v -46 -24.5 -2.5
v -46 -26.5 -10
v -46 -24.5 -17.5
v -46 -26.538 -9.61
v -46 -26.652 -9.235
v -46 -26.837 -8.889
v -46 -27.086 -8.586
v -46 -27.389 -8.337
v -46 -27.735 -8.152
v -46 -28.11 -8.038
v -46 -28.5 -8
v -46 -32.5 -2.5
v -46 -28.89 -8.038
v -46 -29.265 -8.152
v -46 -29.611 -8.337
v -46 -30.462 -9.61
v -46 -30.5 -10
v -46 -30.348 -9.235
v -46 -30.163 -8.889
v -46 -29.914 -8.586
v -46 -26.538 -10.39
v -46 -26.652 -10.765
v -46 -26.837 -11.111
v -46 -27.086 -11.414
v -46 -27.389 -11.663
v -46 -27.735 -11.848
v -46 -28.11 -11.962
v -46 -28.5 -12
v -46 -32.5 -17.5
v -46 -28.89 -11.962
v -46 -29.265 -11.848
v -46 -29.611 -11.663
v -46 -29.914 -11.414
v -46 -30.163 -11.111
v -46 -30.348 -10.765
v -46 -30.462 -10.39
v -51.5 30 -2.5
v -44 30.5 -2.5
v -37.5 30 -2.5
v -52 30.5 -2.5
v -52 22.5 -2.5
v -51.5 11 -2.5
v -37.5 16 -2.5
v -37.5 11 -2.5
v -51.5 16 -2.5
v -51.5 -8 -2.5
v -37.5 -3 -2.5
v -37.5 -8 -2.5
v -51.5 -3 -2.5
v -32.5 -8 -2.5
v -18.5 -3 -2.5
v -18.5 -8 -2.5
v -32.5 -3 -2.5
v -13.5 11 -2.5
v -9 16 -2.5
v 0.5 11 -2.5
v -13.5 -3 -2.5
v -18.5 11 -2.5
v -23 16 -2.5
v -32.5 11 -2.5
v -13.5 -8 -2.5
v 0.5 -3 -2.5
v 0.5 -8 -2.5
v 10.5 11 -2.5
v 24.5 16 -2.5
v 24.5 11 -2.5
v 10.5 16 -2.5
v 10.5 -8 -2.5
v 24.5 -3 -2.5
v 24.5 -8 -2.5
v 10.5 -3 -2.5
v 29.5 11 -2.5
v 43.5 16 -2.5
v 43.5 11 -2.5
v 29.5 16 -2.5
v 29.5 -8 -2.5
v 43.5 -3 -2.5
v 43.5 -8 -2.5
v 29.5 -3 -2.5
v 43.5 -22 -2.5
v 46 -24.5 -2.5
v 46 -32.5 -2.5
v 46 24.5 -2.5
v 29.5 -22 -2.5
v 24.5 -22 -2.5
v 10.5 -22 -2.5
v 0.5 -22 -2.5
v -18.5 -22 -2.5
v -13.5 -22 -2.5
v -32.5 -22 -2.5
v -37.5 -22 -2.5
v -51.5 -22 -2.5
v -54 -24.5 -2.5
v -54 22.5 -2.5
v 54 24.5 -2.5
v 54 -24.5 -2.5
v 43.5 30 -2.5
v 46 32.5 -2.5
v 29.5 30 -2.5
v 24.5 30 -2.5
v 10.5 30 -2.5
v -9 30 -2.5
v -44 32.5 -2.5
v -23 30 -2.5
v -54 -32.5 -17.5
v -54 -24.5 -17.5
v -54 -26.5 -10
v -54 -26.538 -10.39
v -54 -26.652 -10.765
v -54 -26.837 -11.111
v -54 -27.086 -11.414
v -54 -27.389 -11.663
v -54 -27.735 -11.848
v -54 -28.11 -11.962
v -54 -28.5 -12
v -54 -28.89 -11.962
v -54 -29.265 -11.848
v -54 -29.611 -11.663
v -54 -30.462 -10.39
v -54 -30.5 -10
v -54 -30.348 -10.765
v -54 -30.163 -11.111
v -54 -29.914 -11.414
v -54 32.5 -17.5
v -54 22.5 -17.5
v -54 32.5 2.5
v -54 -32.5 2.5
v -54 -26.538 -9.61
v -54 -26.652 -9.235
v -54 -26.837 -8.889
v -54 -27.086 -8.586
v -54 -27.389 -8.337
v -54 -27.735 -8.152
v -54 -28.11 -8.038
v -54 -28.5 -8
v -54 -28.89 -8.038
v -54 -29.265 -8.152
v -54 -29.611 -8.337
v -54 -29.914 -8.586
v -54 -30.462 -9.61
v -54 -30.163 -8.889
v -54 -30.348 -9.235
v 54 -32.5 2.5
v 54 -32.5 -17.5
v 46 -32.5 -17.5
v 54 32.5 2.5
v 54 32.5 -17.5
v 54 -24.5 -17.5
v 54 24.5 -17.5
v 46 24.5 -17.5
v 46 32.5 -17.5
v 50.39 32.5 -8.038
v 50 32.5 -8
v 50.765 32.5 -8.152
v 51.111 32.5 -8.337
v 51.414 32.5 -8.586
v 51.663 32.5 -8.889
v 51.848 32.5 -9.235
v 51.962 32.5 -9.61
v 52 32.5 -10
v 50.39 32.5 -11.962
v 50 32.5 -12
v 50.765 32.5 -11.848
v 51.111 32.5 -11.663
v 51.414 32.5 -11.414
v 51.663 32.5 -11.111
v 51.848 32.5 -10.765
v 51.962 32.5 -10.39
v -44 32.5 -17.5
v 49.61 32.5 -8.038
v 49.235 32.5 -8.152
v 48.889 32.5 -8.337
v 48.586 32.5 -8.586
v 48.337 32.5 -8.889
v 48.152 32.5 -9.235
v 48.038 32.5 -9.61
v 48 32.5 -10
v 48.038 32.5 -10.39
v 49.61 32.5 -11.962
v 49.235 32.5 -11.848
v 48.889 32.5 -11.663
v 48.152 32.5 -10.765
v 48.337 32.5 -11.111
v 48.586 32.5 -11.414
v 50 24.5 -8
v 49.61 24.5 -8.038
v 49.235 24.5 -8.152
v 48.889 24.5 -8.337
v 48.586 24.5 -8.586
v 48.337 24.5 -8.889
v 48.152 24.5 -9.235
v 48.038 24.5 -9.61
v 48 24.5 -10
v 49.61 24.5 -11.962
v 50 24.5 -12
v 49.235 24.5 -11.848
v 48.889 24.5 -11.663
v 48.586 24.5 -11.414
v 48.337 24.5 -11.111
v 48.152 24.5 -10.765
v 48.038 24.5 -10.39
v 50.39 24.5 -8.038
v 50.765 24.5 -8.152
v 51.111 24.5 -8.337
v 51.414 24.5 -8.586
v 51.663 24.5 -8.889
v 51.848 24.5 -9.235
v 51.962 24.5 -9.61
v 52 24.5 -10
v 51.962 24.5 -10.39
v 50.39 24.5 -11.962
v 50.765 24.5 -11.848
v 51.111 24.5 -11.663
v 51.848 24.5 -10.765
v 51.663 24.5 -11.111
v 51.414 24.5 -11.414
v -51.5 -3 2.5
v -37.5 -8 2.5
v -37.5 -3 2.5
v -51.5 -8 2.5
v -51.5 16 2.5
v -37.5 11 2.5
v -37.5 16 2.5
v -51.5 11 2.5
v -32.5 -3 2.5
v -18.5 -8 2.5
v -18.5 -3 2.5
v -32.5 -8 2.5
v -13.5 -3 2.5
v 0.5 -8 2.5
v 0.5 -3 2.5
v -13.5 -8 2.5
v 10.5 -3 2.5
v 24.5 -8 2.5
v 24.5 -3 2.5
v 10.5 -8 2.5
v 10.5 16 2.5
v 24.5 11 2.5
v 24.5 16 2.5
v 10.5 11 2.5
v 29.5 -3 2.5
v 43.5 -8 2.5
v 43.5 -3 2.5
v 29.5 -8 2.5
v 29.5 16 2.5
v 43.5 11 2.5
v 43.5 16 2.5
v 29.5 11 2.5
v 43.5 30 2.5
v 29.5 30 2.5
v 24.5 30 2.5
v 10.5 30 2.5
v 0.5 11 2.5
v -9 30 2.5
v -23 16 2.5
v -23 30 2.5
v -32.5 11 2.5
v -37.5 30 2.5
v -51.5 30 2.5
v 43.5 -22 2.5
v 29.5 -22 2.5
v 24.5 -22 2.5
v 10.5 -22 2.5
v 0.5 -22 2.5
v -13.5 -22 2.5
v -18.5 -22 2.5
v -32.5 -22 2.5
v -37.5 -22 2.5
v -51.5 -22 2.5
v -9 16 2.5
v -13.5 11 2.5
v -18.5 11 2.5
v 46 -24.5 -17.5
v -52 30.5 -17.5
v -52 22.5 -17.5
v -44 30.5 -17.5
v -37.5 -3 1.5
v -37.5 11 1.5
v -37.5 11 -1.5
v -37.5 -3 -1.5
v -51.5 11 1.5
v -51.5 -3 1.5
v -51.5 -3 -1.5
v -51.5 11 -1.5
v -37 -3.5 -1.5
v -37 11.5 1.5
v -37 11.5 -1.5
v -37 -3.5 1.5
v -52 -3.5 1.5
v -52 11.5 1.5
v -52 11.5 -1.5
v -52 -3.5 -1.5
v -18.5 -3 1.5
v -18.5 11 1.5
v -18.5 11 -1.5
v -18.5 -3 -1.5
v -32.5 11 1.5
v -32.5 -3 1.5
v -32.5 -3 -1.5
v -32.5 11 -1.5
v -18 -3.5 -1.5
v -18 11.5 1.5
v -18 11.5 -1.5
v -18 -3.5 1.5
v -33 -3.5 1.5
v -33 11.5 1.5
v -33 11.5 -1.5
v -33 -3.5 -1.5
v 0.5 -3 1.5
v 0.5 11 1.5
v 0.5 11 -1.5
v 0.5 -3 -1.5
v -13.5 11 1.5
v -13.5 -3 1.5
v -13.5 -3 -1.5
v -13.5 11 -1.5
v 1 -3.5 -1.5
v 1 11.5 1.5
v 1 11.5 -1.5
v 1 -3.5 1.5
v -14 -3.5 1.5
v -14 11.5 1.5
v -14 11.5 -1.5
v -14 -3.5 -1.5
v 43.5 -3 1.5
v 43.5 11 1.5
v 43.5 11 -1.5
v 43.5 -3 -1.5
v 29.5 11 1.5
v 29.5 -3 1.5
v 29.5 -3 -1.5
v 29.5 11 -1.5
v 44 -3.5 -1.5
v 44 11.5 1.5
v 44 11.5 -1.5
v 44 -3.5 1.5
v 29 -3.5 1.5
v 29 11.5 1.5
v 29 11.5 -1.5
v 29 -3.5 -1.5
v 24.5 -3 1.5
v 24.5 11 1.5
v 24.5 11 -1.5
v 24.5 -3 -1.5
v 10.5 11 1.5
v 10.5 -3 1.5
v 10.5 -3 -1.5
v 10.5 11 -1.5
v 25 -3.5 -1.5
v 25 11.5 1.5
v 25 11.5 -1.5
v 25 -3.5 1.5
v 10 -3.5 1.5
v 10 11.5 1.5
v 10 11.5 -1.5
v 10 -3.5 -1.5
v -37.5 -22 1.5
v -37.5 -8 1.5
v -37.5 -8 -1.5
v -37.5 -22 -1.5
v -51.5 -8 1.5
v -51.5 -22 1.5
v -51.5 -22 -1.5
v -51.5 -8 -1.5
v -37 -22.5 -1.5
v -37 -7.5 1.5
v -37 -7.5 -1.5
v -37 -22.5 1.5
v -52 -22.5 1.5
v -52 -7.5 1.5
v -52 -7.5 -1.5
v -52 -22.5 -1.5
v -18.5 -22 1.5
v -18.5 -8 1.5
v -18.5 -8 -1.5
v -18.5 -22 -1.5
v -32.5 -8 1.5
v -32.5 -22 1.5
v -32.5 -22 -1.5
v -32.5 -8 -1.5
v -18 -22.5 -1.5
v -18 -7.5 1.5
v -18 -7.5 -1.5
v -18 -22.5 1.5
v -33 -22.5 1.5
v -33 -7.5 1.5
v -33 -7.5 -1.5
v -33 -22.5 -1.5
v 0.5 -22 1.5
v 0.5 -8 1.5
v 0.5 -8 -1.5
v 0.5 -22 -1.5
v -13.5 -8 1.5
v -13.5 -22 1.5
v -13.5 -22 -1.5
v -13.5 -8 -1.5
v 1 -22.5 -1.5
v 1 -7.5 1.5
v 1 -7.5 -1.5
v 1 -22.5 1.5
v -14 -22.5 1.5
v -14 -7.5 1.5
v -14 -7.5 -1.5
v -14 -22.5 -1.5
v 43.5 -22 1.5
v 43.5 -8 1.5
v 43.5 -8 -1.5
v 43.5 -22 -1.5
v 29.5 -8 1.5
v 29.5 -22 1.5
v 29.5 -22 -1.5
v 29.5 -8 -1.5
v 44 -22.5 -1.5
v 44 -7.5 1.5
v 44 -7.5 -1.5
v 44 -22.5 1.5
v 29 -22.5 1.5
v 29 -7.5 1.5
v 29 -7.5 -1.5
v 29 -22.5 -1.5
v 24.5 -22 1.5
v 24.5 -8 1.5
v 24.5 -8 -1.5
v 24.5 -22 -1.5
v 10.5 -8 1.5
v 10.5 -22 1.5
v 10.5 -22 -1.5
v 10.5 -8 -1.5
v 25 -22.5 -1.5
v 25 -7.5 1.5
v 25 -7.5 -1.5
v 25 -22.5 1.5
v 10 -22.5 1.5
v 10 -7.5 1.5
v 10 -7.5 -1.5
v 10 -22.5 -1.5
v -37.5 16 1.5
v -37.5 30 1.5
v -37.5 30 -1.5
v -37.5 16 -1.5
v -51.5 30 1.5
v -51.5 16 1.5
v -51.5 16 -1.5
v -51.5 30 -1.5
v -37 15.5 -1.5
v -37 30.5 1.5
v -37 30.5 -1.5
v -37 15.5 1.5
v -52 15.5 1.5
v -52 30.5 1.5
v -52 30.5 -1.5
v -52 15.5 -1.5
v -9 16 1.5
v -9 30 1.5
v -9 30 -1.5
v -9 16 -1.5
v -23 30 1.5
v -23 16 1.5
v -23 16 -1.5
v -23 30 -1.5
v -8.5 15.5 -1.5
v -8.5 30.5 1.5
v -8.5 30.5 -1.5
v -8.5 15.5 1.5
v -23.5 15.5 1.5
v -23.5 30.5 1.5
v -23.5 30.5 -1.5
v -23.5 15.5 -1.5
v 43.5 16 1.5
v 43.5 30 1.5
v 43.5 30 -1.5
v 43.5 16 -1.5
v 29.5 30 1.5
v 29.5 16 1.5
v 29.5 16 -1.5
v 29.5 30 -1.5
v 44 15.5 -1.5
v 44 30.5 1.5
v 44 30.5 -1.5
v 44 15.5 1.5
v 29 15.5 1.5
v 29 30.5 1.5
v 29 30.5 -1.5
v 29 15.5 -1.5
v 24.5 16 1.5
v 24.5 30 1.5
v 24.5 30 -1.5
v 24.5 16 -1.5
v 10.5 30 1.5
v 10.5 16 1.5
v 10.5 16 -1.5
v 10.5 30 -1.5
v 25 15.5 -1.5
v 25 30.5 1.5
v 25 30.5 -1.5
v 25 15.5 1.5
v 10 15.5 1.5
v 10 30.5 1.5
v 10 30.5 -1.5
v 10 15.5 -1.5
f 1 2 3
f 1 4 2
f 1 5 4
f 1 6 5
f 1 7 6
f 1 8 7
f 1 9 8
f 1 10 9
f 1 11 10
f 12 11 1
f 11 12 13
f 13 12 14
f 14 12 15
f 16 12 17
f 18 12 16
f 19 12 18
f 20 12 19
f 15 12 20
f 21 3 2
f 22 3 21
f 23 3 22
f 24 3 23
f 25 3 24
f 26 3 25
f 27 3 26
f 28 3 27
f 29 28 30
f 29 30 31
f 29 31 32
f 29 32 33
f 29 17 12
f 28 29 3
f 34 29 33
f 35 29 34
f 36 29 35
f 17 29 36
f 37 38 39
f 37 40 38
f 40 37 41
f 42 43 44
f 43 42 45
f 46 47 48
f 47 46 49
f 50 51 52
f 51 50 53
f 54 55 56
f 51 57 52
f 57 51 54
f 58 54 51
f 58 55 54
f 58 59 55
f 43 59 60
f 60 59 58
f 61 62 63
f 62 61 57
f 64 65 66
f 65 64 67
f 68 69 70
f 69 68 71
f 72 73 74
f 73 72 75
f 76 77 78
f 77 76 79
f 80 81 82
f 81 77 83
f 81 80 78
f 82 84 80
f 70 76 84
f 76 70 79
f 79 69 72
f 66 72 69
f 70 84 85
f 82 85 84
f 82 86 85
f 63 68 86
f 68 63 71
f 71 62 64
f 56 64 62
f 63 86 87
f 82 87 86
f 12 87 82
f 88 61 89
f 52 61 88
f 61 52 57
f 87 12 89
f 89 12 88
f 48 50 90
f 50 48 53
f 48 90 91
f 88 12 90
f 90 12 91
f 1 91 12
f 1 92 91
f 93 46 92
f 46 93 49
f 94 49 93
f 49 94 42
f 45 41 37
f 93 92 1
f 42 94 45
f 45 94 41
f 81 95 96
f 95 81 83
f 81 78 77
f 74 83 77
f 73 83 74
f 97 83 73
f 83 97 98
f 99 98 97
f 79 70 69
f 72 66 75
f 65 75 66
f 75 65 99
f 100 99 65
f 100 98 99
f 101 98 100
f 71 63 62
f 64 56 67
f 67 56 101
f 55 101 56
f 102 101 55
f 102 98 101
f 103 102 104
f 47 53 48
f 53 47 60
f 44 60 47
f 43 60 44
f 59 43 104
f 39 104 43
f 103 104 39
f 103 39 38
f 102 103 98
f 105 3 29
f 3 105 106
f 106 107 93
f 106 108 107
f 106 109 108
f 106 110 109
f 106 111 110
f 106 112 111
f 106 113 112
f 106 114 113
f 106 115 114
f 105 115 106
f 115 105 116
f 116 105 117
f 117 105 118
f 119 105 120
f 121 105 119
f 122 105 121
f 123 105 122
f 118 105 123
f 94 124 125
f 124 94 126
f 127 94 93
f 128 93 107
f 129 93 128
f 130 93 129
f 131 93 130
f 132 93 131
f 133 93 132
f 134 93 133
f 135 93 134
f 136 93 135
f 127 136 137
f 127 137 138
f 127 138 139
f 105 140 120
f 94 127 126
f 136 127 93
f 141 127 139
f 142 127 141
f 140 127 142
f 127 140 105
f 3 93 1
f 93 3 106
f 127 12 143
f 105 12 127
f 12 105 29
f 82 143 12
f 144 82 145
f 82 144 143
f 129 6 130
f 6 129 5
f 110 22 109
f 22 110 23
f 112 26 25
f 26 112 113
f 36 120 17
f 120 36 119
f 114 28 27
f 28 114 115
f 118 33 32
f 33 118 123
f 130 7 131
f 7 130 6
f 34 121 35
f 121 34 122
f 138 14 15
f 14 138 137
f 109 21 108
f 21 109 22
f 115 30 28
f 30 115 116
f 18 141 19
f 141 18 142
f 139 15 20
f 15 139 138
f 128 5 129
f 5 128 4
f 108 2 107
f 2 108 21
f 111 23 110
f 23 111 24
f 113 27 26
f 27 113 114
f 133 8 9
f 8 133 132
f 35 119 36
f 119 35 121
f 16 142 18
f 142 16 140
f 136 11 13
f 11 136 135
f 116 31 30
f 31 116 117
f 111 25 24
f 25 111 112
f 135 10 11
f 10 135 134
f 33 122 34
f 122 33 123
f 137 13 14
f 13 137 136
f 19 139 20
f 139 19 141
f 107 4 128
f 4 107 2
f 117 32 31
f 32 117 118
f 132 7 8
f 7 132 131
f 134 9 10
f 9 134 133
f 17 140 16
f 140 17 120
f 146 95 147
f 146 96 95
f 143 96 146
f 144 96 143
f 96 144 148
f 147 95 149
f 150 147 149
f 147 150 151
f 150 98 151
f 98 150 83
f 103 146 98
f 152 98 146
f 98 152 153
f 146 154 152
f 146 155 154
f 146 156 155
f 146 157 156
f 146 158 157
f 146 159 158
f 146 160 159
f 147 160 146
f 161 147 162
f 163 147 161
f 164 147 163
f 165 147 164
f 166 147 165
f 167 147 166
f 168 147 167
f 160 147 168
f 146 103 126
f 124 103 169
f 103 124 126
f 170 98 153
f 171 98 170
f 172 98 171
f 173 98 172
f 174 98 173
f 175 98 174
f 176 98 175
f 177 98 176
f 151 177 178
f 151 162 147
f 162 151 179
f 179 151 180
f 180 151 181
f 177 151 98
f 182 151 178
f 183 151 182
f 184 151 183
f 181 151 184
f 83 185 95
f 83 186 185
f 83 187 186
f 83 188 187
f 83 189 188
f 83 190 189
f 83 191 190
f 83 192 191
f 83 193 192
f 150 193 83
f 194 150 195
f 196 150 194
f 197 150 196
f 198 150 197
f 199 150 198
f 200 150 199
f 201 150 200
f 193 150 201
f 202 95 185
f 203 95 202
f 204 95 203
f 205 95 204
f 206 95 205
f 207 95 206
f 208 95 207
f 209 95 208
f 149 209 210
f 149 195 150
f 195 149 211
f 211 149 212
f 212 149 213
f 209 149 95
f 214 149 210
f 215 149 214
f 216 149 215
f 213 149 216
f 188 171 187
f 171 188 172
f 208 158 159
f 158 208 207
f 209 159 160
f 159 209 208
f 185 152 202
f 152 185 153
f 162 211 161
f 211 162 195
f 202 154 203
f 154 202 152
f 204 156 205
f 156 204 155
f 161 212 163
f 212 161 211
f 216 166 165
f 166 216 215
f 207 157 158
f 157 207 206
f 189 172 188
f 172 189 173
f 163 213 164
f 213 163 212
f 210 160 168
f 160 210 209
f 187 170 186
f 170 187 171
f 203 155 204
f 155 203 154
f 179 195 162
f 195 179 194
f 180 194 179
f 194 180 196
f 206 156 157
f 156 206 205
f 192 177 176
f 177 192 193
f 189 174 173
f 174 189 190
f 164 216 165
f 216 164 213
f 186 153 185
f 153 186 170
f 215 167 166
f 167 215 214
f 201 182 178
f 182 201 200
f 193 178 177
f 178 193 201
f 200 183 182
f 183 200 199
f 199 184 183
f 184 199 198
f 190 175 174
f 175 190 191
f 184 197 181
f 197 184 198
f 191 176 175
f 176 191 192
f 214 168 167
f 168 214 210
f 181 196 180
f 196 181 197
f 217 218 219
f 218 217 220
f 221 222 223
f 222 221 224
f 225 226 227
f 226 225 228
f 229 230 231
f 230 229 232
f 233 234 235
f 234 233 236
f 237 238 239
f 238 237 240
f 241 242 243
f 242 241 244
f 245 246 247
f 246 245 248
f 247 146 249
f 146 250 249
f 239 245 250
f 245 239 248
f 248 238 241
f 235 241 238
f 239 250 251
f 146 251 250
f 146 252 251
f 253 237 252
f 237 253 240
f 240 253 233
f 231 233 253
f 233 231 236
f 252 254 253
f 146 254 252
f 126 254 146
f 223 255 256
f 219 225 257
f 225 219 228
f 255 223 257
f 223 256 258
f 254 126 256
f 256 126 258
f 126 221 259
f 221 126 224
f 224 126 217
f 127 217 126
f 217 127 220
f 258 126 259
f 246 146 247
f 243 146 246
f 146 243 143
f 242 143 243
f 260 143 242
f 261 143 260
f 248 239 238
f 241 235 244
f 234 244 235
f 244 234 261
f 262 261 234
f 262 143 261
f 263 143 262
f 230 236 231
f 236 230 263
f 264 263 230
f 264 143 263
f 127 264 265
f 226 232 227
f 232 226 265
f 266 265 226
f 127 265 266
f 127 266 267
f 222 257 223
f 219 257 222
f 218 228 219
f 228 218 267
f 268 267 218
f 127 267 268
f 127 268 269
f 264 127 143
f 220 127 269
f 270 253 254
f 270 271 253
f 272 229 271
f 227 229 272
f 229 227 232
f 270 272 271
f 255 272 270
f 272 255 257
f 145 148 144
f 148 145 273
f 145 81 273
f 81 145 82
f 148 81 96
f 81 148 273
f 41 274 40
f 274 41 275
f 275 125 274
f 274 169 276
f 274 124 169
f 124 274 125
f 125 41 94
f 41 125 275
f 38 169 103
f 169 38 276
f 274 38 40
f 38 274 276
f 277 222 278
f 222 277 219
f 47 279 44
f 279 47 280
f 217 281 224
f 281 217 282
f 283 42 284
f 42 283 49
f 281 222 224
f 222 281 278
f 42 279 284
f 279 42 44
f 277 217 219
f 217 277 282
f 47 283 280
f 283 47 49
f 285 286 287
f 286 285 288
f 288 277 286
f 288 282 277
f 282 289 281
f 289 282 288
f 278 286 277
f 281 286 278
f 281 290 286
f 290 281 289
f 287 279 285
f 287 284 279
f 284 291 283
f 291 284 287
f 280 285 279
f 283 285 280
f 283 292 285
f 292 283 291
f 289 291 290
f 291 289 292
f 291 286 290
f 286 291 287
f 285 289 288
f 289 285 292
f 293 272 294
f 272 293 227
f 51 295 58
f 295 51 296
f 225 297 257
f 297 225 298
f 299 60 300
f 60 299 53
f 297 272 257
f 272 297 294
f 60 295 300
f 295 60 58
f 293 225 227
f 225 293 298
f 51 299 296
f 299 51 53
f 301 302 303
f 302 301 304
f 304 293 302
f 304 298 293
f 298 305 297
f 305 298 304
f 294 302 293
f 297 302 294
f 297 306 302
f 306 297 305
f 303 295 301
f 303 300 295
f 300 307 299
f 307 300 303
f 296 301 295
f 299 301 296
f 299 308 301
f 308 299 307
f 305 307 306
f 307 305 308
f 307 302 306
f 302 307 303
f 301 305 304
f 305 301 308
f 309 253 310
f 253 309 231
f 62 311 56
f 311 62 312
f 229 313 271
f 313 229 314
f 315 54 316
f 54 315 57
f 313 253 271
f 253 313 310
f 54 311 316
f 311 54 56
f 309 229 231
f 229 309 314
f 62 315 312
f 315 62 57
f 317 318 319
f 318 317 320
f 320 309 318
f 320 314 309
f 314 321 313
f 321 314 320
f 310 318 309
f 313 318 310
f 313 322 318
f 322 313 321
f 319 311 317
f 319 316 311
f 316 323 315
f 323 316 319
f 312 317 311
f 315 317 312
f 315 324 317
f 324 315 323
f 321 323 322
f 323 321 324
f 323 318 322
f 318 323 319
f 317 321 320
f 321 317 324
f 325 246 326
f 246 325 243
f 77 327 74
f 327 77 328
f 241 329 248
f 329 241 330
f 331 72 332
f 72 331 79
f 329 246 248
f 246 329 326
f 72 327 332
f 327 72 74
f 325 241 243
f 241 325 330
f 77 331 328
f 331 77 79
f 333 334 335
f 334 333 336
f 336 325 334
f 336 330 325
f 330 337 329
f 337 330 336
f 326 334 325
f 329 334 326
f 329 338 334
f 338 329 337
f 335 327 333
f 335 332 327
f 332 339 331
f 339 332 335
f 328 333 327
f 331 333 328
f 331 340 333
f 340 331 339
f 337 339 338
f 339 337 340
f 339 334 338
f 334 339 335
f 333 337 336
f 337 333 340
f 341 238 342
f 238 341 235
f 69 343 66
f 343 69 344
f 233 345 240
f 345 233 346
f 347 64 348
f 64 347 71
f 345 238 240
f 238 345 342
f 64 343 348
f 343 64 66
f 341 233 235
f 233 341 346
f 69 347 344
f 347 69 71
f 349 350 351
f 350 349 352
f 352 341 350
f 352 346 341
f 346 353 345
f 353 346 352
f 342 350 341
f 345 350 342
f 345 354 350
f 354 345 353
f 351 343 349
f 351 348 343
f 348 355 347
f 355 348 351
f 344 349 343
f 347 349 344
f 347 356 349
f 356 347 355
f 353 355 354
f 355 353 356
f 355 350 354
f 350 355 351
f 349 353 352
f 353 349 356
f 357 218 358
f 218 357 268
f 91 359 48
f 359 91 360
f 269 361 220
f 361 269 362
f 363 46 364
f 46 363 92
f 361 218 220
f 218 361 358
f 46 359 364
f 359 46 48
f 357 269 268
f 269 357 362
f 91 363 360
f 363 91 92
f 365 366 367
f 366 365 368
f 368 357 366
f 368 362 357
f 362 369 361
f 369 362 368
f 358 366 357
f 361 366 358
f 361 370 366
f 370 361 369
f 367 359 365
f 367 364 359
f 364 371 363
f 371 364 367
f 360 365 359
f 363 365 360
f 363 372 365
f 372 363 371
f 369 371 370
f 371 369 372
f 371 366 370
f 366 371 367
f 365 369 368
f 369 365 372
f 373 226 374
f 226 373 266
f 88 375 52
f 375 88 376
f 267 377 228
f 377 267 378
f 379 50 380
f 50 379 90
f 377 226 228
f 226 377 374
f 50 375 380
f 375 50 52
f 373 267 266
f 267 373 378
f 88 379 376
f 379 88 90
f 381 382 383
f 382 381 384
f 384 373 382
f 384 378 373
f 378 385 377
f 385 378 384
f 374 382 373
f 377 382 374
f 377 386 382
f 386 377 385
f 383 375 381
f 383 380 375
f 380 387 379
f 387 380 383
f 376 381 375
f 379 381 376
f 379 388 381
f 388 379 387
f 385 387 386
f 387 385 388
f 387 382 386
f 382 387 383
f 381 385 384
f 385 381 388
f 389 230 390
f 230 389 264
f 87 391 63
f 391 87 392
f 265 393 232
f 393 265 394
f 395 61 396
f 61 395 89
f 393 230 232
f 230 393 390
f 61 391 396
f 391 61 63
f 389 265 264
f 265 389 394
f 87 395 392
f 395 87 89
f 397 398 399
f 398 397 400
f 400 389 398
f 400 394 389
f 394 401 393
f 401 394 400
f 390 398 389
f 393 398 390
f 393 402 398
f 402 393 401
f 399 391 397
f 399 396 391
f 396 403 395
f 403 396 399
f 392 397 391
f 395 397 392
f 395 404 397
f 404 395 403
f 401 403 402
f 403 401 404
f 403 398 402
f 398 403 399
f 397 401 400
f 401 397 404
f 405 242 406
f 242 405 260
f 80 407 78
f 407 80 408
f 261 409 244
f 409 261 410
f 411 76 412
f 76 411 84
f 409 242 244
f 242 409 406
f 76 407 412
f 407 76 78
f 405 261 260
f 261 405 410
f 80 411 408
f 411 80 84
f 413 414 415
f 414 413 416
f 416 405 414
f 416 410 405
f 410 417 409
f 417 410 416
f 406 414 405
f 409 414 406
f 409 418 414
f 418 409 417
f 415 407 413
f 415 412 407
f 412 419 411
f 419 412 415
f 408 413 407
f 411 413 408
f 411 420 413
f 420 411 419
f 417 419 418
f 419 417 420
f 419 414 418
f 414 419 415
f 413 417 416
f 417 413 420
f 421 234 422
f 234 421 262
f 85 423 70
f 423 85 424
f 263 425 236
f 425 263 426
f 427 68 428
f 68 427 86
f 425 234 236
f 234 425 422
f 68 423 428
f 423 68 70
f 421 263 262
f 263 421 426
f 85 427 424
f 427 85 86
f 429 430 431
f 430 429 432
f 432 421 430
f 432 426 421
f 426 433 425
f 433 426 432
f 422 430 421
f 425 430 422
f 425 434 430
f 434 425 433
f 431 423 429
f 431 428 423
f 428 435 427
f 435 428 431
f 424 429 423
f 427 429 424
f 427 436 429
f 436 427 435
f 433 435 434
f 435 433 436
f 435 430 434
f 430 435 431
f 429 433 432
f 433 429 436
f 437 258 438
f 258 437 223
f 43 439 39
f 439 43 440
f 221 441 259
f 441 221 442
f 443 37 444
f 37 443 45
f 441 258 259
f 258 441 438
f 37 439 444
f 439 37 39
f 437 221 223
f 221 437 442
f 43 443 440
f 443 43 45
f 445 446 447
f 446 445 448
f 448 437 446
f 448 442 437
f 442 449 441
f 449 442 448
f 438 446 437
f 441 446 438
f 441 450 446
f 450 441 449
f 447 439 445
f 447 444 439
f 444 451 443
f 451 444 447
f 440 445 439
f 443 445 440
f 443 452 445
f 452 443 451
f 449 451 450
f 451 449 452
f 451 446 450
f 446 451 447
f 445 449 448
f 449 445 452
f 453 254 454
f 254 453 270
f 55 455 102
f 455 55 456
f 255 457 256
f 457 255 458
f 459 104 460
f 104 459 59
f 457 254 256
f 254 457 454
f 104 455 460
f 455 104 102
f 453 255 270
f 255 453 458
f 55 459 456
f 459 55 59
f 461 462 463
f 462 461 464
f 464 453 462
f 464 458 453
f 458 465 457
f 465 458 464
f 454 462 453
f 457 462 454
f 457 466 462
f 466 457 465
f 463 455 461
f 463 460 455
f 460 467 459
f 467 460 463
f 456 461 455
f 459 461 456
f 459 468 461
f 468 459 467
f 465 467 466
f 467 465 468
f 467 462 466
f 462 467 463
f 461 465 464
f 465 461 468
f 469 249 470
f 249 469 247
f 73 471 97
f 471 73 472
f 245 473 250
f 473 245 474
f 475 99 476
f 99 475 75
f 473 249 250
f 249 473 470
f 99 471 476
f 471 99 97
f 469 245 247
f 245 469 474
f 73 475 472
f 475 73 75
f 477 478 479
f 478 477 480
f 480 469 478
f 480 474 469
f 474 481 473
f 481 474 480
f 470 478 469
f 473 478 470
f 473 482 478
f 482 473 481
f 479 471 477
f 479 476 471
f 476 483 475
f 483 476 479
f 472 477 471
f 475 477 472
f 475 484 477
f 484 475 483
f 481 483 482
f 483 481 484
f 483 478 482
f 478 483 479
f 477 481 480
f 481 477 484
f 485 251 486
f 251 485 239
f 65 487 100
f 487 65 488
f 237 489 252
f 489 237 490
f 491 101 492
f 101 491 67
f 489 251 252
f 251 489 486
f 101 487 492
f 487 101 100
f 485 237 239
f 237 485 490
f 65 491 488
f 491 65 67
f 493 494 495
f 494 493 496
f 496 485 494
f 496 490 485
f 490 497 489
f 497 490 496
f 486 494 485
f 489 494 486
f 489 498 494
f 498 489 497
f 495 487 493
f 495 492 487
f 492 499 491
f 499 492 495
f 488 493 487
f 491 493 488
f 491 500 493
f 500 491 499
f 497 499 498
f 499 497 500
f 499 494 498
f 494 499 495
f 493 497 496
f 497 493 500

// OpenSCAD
// file: common.scad
key_size = 14;

b_post = 8;
m_post_s = 2;
m_post_l = 10;
post_z = 15;

plat_z = 5;

module keyhole(x, y) {
  translate([x, y, 0]) {
    cube([key_size, key_size, plat_z + 1], center = true);
    cube([key_size + 1, key_size + 1, plat_z -2], center = true);
  }
}

module e_post(x, y, z) {
  translate([x, y, -(plat_z + post_z)/2]) {
    cube([b_post, b_post, post_z], center = true);
  }
}

module e_post_i(x, y, r) {
  translate([x, y, -(plat_z + post_z)/2]) {
    difference() {
      cube([b_post, b_post, post_z], center = true);
      rotate(r) cylinder(h=b_post+1, r=2, center=true, $fn=32);
    }
  }
}

module e_post_x(x, y) {
  e_post_i(x, y, [0, 90, 0]);
}


module e_post_y(x, y) {
  e_post_i(x, y, [90, 0, 0]);
}

module i_post_x(x, y) {
  translate([x, y, -(plat_z + post_z)/2]) cube([m_post_l, m_post_s, post_z], center = true);
}

module i_post_y(x, y) {
  translate([x, y, -(plat_z + post_z)/2]) cube([m_post_s, m_post_l, post_z], center = true);
}
// file: parameters.scad
key_size = 14;
key_sep = 5;
m_key_sep = 13.5;
l_key_sep = 33;

border = 8;
b_post = 8;
m_post_s = 2;
m_post_l = 10;
post_z = 15;

key_cell = key_size + key_sep;
m_key_cell_x = key_size + m_key_sep;
l_key_cell_x = 2*key_cell;

plat_z = 5;
// main file
// Ortho Mega section 8. Bottom right corner

include <parameters.scad>

extra = 5;

plat_x = border + 5*key_cell + extra;
plat_y = border + 3*key_cell;

use <common.scad>

difference() {
  union() {
    cube([plat_x, plat_y, 5], center = true);
    e_post_x(-(plat_x-b_post)/2, -(plat_y-b_post)/2);
    e_post((plat_x-b_post)/2, -(plat_y-b_post)/2);
    e_post_y((plat_x-b_post)/2, (plat_y-b_post)/2);
    
    i_post_y(-(plat_x - m_post_s)/2, (plat_y - m_post_l)/2);
    i_post_x(-(plat_x - m_post_l)/2, (plat_y - m_post_s)/2);
  }

  for (y = [1:2]) {
    for (x = [0:2]) {
      keyhole(-plat_x/2 + key_cell/2 + x*key_cell, plat_y/2 - key_cell/2 - y*key_cell);
    }
    for (x = [0:1]) {
      keyhole(plat_x/2 - border - key_cell/2 - x*key_cell, plat_y/2 - key_cell/2 - y*key_cell);
    }
  }
  keyhole(-plat_x/2 + key_cell/2, plat_y/2 - key_cell/2);
  // TODO: large key brace holders
  keyhole(-plat_x/2 + key_cell + l_key_cell_x/2, plat_y/2 - key_cell/2);
  for (x = [0:1]) {
    keyhole(plat_x/2 - border - key_cell/2 - x*key_cell, plat_y/2 - key_cell/2);
  }

}
